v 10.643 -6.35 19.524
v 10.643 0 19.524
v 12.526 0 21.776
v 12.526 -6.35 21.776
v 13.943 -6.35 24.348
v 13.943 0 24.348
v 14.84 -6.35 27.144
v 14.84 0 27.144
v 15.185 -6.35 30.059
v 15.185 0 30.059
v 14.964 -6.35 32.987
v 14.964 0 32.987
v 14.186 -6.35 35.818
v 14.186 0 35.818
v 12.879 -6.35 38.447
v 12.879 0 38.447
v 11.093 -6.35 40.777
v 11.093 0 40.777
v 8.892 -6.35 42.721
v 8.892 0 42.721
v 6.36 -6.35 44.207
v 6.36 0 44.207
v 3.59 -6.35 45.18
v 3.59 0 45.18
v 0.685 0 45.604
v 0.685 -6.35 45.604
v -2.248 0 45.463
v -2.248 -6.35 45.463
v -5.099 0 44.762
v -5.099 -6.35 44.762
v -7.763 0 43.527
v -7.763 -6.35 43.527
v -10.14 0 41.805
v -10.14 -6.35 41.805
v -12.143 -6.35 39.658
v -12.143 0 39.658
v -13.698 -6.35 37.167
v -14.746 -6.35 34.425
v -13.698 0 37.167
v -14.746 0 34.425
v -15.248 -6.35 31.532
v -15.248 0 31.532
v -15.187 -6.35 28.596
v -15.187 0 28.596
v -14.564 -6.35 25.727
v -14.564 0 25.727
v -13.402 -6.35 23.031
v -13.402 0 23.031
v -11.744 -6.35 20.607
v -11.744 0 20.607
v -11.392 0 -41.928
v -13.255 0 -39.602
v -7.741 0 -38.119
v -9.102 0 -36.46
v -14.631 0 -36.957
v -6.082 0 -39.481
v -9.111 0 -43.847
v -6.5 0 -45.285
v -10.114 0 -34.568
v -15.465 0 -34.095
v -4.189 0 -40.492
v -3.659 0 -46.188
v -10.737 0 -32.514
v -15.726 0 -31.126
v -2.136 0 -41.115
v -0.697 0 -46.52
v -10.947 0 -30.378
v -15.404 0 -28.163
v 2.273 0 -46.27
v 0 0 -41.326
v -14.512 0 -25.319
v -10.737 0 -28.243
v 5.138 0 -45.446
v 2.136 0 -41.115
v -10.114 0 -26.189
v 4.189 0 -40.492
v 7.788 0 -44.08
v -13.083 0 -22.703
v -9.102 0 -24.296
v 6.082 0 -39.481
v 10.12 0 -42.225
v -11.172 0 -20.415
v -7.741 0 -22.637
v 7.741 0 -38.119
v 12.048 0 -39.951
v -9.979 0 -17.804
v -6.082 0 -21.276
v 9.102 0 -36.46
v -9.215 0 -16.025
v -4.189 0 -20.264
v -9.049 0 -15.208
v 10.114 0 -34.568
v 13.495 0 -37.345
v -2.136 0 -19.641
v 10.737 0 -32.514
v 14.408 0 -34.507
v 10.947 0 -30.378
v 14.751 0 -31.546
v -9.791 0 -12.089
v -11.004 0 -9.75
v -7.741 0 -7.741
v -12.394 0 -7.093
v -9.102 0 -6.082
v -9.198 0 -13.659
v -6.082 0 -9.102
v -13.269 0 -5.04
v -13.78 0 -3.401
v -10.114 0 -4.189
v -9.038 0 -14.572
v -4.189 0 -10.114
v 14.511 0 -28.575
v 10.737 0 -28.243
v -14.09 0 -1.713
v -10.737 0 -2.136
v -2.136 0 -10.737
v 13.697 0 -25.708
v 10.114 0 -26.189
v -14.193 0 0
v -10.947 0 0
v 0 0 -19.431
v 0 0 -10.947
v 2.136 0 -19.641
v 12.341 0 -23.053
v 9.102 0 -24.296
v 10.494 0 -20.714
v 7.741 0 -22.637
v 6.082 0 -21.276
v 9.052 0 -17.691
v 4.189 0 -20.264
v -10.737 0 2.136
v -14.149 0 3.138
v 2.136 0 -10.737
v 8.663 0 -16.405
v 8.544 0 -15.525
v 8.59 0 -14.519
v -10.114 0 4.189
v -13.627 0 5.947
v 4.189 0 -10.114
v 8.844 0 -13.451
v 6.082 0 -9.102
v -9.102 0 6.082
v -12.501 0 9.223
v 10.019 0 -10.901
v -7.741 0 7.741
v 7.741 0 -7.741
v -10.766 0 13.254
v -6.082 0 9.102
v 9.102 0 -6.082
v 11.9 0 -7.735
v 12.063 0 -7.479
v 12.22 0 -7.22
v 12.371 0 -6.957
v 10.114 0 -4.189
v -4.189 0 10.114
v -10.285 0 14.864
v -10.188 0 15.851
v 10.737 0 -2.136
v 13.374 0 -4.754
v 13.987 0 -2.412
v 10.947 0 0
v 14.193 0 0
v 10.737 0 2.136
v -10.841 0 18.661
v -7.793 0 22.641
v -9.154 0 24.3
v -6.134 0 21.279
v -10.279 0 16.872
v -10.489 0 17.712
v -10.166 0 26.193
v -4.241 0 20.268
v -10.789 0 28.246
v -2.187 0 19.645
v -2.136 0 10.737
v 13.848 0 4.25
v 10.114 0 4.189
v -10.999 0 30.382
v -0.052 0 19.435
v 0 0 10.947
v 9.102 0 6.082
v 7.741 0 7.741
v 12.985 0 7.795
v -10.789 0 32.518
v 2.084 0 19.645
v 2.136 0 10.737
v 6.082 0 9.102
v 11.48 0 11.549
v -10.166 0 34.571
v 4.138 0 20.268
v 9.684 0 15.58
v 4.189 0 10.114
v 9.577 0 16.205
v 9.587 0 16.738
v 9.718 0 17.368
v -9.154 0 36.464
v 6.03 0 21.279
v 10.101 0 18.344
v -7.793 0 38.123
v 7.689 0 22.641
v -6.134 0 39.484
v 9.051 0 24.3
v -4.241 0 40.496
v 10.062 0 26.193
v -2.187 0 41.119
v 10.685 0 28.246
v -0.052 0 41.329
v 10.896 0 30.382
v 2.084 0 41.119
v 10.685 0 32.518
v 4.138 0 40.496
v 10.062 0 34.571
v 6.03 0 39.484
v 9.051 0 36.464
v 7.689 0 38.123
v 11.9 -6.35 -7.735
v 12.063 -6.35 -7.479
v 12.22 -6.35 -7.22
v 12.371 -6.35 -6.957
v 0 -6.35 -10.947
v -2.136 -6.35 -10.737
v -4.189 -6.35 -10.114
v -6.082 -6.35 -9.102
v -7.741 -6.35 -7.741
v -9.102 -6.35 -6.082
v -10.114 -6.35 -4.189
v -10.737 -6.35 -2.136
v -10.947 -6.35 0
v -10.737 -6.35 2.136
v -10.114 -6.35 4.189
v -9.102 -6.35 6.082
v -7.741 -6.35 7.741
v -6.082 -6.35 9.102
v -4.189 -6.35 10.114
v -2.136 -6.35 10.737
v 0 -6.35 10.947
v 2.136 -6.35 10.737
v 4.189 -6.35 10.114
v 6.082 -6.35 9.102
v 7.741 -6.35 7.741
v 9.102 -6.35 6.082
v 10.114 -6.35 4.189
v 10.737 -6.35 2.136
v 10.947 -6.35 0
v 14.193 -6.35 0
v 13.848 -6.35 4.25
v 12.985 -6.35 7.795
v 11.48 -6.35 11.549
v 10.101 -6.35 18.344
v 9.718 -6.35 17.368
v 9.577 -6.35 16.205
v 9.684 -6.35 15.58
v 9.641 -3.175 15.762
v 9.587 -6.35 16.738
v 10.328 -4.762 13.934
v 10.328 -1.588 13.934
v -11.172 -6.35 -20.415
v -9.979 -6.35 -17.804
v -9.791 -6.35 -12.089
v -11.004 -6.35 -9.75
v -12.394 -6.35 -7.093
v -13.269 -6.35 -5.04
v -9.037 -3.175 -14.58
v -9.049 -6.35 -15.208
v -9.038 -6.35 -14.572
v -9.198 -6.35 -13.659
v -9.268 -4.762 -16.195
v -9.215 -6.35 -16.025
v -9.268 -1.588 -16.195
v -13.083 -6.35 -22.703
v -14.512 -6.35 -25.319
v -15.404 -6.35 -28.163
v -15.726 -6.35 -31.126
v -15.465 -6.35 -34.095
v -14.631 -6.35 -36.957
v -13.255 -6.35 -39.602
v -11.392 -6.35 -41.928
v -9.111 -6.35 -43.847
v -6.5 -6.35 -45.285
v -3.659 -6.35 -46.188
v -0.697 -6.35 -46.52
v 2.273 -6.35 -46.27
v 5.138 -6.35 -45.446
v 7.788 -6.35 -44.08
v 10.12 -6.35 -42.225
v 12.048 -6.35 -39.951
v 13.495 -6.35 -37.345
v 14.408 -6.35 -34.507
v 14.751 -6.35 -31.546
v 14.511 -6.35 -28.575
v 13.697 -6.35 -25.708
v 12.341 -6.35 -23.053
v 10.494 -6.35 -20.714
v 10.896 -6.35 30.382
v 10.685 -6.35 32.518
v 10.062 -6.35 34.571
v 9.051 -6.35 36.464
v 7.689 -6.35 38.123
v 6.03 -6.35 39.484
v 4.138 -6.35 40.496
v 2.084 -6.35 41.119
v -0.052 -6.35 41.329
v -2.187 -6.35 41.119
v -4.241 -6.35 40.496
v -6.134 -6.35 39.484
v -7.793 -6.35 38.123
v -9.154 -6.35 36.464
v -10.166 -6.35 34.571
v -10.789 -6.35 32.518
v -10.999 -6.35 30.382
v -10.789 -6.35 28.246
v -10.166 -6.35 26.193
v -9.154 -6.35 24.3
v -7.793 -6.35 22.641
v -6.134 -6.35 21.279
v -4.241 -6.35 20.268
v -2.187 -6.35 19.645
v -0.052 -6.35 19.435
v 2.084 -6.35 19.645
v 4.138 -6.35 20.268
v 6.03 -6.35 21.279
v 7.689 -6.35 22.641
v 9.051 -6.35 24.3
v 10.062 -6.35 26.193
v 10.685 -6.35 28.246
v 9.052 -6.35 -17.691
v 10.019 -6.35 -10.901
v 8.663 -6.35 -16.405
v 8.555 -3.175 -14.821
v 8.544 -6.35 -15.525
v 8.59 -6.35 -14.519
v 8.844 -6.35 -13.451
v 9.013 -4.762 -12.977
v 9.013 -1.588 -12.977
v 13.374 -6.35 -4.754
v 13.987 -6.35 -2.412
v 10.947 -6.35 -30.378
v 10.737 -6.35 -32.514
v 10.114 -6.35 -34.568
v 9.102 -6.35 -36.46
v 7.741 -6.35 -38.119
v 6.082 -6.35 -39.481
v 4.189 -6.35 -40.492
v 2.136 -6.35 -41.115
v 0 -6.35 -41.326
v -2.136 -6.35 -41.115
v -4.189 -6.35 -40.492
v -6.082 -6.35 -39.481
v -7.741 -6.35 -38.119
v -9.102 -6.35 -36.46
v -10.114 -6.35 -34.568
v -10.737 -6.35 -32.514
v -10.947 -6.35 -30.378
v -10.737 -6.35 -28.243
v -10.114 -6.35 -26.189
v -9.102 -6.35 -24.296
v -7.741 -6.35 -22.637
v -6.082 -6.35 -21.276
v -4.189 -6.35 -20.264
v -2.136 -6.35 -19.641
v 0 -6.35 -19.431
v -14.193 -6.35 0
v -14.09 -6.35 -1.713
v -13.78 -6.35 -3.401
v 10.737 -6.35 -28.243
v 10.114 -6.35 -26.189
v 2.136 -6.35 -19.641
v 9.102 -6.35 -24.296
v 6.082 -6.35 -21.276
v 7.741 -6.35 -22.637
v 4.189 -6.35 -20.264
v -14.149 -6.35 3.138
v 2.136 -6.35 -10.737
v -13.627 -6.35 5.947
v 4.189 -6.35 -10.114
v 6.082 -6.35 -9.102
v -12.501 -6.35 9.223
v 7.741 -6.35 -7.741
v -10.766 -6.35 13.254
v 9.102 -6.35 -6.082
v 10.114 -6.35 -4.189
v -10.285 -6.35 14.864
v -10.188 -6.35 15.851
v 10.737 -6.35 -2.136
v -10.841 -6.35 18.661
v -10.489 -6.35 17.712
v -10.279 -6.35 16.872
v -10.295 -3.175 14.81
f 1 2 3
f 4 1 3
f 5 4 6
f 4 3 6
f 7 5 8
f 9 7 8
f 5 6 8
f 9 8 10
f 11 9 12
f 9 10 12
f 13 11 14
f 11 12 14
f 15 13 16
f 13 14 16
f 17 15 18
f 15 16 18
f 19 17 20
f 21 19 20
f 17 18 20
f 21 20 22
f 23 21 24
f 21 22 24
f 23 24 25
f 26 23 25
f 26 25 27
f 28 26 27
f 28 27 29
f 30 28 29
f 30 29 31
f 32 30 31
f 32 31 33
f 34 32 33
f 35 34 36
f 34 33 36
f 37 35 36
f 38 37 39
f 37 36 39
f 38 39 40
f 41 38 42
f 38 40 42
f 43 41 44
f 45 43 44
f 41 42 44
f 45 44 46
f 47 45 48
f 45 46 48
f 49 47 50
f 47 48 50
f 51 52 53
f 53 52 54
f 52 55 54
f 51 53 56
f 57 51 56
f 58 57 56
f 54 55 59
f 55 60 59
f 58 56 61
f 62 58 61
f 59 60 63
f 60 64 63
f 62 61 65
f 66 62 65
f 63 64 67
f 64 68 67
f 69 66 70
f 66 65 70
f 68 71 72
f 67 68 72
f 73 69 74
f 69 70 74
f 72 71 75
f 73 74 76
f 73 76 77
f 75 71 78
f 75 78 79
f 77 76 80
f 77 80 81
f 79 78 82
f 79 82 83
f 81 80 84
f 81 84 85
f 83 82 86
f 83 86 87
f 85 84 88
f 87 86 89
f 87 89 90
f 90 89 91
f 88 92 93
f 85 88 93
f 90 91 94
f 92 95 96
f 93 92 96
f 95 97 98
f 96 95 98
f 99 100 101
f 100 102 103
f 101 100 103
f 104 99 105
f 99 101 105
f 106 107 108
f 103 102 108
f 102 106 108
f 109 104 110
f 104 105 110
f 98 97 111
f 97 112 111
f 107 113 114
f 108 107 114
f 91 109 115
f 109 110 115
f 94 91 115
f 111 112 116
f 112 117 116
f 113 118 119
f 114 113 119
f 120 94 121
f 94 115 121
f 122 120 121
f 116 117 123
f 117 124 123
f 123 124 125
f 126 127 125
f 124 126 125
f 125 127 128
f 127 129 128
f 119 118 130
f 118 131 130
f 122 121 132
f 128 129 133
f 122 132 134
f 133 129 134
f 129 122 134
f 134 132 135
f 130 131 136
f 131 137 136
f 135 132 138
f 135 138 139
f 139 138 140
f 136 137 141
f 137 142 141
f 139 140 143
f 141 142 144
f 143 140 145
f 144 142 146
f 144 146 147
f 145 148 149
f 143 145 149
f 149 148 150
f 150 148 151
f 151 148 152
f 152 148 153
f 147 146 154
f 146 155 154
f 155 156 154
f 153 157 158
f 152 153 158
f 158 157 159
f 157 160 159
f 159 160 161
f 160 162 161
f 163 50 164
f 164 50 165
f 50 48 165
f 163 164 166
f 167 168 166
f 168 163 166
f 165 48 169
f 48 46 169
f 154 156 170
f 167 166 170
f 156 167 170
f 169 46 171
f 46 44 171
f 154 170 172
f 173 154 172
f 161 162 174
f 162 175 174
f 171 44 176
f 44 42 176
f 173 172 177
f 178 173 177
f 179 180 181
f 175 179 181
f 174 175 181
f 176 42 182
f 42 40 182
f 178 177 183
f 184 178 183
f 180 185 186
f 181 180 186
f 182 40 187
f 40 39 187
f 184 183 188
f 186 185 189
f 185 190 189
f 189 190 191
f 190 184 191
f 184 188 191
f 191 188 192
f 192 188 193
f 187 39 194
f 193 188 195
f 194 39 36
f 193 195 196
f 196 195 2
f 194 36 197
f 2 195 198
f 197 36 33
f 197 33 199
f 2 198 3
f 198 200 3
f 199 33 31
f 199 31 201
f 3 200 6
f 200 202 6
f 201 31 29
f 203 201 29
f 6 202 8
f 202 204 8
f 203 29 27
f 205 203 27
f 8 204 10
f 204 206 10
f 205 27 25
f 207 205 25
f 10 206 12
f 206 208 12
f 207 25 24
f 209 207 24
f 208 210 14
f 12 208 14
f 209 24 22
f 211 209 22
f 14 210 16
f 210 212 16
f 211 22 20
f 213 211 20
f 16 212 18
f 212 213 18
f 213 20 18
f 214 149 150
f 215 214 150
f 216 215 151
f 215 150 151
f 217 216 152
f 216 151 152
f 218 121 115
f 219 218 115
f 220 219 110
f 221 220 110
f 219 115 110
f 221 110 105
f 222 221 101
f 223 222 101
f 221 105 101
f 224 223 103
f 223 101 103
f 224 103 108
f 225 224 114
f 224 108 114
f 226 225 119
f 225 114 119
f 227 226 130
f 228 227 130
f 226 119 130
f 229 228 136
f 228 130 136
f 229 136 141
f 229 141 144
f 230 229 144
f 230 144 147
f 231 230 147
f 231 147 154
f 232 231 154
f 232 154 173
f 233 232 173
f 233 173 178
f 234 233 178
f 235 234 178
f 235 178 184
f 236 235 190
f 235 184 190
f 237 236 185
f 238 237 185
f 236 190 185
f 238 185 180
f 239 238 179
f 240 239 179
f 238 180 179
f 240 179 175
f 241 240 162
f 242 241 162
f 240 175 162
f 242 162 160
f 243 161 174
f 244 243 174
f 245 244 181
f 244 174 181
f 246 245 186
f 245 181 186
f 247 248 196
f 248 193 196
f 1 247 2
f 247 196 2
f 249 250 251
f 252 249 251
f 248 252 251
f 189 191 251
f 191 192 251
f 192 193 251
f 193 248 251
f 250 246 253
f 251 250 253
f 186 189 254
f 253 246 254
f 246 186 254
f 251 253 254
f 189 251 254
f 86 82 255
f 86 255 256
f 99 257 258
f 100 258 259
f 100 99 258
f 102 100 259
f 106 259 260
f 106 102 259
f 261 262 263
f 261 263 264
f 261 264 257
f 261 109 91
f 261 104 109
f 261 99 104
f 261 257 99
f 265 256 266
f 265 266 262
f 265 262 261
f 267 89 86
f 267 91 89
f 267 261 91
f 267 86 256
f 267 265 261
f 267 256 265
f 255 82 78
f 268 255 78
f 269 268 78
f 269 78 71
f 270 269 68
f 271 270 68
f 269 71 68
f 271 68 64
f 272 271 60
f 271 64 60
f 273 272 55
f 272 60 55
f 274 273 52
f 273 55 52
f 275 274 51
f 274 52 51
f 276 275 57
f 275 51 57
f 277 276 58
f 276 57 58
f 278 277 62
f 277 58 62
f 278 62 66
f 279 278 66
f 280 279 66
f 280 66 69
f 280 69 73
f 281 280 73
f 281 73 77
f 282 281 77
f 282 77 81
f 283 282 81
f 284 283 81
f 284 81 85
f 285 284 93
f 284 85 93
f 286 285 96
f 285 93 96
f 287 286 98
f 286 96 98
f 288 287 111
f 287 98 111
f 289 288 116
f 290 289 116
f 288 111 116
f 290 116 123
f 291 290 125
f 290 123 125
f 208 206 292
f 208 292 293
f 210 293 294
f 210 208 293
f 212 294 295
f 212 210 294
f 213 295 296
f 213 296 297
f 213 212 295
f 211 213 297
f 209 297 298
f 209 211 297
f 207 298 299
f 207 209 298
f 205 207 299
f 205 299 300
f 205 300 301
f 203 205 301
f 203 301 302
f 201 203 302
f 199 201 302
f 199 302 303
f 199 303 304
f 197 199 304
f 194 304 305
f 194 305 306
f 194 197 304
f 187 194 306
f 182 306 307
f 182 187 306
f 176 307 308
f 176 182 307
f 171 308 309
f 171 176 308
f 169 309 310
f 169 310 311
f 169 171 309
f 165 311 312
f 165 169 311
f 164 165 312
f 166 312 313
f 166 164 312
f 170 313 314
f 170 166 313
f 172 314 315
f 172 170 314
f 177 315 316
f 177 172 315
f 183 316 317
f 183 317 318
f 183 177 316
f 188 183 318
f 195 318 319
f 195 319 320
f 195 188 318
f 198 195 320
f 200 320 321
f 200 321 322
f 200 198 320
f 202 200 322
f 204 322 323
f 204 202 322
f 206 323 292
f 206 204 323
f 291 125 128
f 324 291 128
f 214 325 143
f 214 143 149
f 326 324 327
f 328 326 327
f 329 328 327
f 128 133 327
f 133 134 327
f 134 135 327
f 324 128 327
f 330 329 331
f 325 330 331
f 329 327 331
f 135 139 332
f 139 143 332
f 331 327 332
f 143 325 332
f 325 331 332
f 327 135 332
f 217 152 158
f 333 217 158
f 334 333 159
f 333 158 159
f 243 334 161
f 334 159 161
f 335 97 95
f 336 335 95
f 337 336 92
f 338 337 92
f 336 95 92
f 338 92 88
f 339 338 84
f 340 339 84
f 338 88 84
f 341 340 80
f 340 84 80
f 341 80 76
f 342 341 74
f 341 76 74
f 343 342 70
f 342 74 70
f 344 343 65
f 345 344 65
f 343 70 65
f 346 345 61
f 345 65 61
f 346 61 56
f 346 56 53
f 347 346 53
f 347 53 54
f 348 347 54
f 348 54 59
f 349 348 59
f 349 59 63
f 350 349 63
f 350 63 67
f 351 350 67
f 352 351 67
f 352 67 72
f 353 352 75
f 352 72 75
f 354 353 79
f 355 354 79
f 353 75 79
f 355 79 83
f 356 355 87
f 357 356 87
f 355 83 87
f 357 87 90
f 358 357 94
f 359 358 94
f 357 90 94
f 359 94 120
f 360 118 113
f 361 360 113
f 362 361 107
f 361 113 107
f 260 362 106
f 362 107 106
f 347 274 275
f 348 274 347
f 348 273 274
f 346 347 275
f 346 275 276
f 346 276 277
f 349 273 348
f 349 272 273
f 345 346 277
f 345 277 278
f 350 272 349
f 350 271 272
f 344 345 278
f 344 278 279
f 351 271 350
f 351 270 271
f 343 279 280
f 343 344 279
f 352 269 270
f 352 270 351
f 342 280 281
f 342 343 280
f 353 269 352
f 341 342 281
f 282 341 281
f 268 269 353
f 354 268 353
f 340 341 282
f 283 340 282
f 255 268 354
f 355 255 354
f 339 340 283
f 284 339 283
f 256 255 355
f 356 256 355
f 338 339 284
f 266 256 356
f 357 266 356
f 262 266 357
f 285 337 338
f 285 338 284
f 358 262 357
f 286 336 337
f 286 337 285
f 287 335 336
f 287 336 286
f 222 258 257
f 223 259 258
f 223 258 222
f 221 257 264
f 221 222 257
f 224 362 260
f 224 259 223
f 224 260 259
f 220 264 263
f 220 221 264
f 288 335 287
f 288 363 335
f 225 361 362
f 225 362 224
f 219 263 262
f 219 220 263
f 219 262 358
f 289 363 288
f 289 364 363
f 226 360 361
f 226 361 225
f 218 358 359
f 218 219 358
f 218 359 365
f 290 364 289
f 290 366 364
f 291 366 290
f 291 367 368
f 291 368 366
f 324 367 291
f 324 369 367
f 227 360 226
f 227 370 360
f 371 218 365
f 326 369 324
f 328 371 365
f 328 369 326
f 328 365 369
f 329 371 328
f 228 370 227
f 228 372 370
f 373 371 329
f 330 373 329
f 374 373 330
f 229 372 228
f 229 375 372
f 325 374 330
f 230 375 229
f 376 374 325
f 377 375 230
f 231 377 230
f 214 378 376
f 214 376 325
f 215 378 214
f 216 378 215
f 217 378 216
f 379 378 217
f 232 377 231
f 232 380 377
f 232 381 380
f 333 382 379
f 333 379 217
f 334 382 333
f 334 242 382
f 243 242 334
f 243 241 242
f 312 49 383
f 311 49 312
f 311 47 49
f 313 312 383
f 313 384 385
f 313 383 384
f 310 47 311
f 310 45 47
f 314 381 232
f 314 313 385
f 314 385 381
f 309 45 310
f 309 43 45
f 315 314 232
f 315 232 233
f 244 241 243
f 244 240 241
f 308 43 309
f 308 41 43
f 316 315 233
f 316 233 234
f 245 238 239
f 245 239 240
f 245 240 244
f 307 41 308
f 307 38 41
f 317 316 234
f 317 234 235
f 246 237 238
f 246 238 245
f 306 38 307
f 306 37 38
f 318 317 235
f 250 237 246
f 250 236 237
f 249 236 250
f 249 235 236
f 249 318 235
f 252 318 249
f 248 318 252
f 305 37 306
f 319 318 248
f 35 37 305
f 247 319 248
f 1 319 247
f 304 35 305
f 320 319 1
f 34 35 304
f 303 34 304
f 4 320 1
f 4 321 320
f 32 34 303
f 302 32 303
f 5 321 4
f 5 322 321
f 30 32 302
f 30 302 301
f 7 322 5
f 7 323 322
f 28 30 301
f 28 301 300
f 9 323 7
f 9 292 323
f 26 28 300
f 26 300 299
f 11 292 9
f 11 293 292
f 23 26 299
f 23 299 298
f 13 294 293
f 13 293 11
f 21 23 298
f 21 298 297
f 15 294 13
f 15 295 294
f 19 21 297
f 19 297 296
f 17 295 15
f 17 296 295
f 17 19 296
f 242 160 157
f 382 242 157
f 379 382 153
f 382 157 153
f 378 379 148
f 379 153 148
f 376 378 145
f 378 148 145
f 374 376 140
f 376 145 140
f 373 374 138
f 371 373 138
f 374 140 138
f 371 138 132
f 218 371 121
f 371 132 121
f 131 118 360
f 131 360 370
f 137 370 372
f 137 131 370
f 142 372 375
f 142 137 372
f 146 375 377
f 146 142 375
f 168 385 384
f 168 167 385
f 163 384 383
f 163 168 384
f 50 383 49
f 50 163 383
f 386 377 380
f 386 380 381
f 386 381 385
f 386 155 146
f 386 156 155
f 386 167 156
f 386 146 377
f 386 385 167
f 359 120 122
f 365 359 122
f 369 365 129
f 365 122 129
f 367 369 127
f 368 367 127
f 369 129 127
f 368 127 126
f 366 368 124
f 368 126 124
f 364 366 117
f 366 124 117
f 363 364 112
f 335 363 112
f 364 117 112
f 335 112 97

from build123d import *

# Parameters (mm, degrees)
F0_R     = 10.9474
F1_DEPTH = 6.35


with BuildPart() as f1:
    # F0 (on Front) → F1 (new body)
    with BuildSketch(Plane.XZ):
        with BuildLine():
            ThreePointArc((-13.2685446816, -5.0396682469), (-8.0598548082, -11.6829480217), (0, -14.1933975498))
            ThreePointArc((0, -14.1933975498), (6.7698516874, -12.4748403652), (11.90029643, -7.7353396101))
            add(Edge.make_bspline(
                [(11.90029643, -7.7353396101), (12.0535593312, -7.4829899095), (12.2107162371, -7.2236926197), (12.3714754304, -6.9569483023)],
                knots=[0.9591774425, 0.9591774425, 0.9591774425, 0.9591774425, 1, 1, 1, 1], degree=3))
            ThreePointArc((12.3714754304, -6.9569483023), (13.7303642171, -3.5957798142), (14.1933975498, 0))
            ThreePointArc((14.1933975498, 0), (0, 14.1933975498), (-14.1933975498, 0))
            ThreePointArc((-14.1933975498, 0), (-13.9602697606, -2.5619137801), (-13.2685446816, -5.0396682469))
        make_face()
        with BuildLine():
            ThreePointArc((0, -10.9474), (-7.7409807764, 7.7409807764), (10.9474, 0))
            ThreePointArc((10.9474, 0), (7.7409807764, -7.7409807764), (0, -10.9474))
        make_face(mode=Mode.SUBTRACT)
        with BuildLine():
            ThreePointArc((11.90029643, -7.7353396101), (6.7698516874, -12.4748403652), (0, -14.1933975498))
            ThreePointArc((0, -14.1933975498), (-8.0598548082, -11.6829480217), (-13.2685446816, -5.0396682469))
            add(Edge.make_bspline(
                [(-11.1718252314, -20.4150509073), (-10.2752013229, -17.9365202276), (-7.1442353987, -14.5969973645), (-11.864830176, -8.898419344), (-13.2685446816, -5.0396682469)],
                knots=[0, 0, 0, 0, 0.4355275546, 1, 1, 1, 1], degree=3))
            ThreePointArc((-11.1718252314, -20.4150509073), (-0.6968379156, -46.5203883622), (10.4937985181, -20.7137291613))
            add(Edge.make_bspline(
                [(10.4937985181, -20.7137291613), (9.1935984748, -18.2370298329), (7.5397029576, -14.7602557648), (10.0158135325, -10.8381693983), (11.90029643, -7.7353396101)],
                knots=[0, 0, 0, 0, 0.4572333258, 0.9591774425, 0.9591774425, 0.9591774425, 0.9591774425], degree=3))
        make_face()
        with BuildLine():
            ThreePointArc((10.9474, -30.3784), (-7.7409807764, -38.1193807764), (0, -19.431))
            ThreePointArc((0, -19.431), (7.7409807764, -22.6374192236), (10.9474, -30.3784))
        make_face(mode=Mode.SUBTRACT)
        with BuildLine():
            add(Edge.make_bspline(
                [(11.90029643, -7.7353396101), (12.0535593312, -7.4829899095), (12.2107162371, -7.2236926197), (12.3714754304, -6.9569483023)],
                knots=[0.9591774425, 0.9591774425, 0.9591774425, 0.9591774425, 1, 1, 1, 1], degree=3))
            ThreePointArc((11.90029643, -7.7353396101), (12.1421250434, -7.3499206416), (12.3714754304, -6.9569483023))
        make_face()
        with BuildLine():
            add(Edge.make_bspline(
                [(-14.1933975498, 0), (-14.7271984955, 6.909354162), (-8.5857084967, 14.3779721791), (-10.7006047161, 18.4330450096), (-11.7443399906, 20.6074653511)],
                knots=[0, 0, 0, 0, 0.6155147833, 1, 1, 1, 1], degree=3))
            ThreePointArc((-14.1933975498, 0), (0, 14.1933975498), (14.1933975498, 0))
            add(Edge.make_bspline(
                [(14.1933975498, 0), (14.1953765387, 8.5541345291), (8.2574436372, 15.3379896379), (9.9090943029, 17.8862823832), (10.6425855816, 19.5242241137)],
                knots=[0, 0, 0, 0, 0.6724502865, 1, 1, 1, 1], degree=3))
            ThreePointArc((10.6425855816, 19.5242241137), (0.6848487841, 45.6041133823), (-11.7443399906, 20.6074653511))
        make_face()
        with Locations((-0.0517107891, 30.3819230013)):
            Circle(F0_R, mode=Mode.SUBTRACT)
    extrude(amount=F1_DEPTH)


solid = f1.part
